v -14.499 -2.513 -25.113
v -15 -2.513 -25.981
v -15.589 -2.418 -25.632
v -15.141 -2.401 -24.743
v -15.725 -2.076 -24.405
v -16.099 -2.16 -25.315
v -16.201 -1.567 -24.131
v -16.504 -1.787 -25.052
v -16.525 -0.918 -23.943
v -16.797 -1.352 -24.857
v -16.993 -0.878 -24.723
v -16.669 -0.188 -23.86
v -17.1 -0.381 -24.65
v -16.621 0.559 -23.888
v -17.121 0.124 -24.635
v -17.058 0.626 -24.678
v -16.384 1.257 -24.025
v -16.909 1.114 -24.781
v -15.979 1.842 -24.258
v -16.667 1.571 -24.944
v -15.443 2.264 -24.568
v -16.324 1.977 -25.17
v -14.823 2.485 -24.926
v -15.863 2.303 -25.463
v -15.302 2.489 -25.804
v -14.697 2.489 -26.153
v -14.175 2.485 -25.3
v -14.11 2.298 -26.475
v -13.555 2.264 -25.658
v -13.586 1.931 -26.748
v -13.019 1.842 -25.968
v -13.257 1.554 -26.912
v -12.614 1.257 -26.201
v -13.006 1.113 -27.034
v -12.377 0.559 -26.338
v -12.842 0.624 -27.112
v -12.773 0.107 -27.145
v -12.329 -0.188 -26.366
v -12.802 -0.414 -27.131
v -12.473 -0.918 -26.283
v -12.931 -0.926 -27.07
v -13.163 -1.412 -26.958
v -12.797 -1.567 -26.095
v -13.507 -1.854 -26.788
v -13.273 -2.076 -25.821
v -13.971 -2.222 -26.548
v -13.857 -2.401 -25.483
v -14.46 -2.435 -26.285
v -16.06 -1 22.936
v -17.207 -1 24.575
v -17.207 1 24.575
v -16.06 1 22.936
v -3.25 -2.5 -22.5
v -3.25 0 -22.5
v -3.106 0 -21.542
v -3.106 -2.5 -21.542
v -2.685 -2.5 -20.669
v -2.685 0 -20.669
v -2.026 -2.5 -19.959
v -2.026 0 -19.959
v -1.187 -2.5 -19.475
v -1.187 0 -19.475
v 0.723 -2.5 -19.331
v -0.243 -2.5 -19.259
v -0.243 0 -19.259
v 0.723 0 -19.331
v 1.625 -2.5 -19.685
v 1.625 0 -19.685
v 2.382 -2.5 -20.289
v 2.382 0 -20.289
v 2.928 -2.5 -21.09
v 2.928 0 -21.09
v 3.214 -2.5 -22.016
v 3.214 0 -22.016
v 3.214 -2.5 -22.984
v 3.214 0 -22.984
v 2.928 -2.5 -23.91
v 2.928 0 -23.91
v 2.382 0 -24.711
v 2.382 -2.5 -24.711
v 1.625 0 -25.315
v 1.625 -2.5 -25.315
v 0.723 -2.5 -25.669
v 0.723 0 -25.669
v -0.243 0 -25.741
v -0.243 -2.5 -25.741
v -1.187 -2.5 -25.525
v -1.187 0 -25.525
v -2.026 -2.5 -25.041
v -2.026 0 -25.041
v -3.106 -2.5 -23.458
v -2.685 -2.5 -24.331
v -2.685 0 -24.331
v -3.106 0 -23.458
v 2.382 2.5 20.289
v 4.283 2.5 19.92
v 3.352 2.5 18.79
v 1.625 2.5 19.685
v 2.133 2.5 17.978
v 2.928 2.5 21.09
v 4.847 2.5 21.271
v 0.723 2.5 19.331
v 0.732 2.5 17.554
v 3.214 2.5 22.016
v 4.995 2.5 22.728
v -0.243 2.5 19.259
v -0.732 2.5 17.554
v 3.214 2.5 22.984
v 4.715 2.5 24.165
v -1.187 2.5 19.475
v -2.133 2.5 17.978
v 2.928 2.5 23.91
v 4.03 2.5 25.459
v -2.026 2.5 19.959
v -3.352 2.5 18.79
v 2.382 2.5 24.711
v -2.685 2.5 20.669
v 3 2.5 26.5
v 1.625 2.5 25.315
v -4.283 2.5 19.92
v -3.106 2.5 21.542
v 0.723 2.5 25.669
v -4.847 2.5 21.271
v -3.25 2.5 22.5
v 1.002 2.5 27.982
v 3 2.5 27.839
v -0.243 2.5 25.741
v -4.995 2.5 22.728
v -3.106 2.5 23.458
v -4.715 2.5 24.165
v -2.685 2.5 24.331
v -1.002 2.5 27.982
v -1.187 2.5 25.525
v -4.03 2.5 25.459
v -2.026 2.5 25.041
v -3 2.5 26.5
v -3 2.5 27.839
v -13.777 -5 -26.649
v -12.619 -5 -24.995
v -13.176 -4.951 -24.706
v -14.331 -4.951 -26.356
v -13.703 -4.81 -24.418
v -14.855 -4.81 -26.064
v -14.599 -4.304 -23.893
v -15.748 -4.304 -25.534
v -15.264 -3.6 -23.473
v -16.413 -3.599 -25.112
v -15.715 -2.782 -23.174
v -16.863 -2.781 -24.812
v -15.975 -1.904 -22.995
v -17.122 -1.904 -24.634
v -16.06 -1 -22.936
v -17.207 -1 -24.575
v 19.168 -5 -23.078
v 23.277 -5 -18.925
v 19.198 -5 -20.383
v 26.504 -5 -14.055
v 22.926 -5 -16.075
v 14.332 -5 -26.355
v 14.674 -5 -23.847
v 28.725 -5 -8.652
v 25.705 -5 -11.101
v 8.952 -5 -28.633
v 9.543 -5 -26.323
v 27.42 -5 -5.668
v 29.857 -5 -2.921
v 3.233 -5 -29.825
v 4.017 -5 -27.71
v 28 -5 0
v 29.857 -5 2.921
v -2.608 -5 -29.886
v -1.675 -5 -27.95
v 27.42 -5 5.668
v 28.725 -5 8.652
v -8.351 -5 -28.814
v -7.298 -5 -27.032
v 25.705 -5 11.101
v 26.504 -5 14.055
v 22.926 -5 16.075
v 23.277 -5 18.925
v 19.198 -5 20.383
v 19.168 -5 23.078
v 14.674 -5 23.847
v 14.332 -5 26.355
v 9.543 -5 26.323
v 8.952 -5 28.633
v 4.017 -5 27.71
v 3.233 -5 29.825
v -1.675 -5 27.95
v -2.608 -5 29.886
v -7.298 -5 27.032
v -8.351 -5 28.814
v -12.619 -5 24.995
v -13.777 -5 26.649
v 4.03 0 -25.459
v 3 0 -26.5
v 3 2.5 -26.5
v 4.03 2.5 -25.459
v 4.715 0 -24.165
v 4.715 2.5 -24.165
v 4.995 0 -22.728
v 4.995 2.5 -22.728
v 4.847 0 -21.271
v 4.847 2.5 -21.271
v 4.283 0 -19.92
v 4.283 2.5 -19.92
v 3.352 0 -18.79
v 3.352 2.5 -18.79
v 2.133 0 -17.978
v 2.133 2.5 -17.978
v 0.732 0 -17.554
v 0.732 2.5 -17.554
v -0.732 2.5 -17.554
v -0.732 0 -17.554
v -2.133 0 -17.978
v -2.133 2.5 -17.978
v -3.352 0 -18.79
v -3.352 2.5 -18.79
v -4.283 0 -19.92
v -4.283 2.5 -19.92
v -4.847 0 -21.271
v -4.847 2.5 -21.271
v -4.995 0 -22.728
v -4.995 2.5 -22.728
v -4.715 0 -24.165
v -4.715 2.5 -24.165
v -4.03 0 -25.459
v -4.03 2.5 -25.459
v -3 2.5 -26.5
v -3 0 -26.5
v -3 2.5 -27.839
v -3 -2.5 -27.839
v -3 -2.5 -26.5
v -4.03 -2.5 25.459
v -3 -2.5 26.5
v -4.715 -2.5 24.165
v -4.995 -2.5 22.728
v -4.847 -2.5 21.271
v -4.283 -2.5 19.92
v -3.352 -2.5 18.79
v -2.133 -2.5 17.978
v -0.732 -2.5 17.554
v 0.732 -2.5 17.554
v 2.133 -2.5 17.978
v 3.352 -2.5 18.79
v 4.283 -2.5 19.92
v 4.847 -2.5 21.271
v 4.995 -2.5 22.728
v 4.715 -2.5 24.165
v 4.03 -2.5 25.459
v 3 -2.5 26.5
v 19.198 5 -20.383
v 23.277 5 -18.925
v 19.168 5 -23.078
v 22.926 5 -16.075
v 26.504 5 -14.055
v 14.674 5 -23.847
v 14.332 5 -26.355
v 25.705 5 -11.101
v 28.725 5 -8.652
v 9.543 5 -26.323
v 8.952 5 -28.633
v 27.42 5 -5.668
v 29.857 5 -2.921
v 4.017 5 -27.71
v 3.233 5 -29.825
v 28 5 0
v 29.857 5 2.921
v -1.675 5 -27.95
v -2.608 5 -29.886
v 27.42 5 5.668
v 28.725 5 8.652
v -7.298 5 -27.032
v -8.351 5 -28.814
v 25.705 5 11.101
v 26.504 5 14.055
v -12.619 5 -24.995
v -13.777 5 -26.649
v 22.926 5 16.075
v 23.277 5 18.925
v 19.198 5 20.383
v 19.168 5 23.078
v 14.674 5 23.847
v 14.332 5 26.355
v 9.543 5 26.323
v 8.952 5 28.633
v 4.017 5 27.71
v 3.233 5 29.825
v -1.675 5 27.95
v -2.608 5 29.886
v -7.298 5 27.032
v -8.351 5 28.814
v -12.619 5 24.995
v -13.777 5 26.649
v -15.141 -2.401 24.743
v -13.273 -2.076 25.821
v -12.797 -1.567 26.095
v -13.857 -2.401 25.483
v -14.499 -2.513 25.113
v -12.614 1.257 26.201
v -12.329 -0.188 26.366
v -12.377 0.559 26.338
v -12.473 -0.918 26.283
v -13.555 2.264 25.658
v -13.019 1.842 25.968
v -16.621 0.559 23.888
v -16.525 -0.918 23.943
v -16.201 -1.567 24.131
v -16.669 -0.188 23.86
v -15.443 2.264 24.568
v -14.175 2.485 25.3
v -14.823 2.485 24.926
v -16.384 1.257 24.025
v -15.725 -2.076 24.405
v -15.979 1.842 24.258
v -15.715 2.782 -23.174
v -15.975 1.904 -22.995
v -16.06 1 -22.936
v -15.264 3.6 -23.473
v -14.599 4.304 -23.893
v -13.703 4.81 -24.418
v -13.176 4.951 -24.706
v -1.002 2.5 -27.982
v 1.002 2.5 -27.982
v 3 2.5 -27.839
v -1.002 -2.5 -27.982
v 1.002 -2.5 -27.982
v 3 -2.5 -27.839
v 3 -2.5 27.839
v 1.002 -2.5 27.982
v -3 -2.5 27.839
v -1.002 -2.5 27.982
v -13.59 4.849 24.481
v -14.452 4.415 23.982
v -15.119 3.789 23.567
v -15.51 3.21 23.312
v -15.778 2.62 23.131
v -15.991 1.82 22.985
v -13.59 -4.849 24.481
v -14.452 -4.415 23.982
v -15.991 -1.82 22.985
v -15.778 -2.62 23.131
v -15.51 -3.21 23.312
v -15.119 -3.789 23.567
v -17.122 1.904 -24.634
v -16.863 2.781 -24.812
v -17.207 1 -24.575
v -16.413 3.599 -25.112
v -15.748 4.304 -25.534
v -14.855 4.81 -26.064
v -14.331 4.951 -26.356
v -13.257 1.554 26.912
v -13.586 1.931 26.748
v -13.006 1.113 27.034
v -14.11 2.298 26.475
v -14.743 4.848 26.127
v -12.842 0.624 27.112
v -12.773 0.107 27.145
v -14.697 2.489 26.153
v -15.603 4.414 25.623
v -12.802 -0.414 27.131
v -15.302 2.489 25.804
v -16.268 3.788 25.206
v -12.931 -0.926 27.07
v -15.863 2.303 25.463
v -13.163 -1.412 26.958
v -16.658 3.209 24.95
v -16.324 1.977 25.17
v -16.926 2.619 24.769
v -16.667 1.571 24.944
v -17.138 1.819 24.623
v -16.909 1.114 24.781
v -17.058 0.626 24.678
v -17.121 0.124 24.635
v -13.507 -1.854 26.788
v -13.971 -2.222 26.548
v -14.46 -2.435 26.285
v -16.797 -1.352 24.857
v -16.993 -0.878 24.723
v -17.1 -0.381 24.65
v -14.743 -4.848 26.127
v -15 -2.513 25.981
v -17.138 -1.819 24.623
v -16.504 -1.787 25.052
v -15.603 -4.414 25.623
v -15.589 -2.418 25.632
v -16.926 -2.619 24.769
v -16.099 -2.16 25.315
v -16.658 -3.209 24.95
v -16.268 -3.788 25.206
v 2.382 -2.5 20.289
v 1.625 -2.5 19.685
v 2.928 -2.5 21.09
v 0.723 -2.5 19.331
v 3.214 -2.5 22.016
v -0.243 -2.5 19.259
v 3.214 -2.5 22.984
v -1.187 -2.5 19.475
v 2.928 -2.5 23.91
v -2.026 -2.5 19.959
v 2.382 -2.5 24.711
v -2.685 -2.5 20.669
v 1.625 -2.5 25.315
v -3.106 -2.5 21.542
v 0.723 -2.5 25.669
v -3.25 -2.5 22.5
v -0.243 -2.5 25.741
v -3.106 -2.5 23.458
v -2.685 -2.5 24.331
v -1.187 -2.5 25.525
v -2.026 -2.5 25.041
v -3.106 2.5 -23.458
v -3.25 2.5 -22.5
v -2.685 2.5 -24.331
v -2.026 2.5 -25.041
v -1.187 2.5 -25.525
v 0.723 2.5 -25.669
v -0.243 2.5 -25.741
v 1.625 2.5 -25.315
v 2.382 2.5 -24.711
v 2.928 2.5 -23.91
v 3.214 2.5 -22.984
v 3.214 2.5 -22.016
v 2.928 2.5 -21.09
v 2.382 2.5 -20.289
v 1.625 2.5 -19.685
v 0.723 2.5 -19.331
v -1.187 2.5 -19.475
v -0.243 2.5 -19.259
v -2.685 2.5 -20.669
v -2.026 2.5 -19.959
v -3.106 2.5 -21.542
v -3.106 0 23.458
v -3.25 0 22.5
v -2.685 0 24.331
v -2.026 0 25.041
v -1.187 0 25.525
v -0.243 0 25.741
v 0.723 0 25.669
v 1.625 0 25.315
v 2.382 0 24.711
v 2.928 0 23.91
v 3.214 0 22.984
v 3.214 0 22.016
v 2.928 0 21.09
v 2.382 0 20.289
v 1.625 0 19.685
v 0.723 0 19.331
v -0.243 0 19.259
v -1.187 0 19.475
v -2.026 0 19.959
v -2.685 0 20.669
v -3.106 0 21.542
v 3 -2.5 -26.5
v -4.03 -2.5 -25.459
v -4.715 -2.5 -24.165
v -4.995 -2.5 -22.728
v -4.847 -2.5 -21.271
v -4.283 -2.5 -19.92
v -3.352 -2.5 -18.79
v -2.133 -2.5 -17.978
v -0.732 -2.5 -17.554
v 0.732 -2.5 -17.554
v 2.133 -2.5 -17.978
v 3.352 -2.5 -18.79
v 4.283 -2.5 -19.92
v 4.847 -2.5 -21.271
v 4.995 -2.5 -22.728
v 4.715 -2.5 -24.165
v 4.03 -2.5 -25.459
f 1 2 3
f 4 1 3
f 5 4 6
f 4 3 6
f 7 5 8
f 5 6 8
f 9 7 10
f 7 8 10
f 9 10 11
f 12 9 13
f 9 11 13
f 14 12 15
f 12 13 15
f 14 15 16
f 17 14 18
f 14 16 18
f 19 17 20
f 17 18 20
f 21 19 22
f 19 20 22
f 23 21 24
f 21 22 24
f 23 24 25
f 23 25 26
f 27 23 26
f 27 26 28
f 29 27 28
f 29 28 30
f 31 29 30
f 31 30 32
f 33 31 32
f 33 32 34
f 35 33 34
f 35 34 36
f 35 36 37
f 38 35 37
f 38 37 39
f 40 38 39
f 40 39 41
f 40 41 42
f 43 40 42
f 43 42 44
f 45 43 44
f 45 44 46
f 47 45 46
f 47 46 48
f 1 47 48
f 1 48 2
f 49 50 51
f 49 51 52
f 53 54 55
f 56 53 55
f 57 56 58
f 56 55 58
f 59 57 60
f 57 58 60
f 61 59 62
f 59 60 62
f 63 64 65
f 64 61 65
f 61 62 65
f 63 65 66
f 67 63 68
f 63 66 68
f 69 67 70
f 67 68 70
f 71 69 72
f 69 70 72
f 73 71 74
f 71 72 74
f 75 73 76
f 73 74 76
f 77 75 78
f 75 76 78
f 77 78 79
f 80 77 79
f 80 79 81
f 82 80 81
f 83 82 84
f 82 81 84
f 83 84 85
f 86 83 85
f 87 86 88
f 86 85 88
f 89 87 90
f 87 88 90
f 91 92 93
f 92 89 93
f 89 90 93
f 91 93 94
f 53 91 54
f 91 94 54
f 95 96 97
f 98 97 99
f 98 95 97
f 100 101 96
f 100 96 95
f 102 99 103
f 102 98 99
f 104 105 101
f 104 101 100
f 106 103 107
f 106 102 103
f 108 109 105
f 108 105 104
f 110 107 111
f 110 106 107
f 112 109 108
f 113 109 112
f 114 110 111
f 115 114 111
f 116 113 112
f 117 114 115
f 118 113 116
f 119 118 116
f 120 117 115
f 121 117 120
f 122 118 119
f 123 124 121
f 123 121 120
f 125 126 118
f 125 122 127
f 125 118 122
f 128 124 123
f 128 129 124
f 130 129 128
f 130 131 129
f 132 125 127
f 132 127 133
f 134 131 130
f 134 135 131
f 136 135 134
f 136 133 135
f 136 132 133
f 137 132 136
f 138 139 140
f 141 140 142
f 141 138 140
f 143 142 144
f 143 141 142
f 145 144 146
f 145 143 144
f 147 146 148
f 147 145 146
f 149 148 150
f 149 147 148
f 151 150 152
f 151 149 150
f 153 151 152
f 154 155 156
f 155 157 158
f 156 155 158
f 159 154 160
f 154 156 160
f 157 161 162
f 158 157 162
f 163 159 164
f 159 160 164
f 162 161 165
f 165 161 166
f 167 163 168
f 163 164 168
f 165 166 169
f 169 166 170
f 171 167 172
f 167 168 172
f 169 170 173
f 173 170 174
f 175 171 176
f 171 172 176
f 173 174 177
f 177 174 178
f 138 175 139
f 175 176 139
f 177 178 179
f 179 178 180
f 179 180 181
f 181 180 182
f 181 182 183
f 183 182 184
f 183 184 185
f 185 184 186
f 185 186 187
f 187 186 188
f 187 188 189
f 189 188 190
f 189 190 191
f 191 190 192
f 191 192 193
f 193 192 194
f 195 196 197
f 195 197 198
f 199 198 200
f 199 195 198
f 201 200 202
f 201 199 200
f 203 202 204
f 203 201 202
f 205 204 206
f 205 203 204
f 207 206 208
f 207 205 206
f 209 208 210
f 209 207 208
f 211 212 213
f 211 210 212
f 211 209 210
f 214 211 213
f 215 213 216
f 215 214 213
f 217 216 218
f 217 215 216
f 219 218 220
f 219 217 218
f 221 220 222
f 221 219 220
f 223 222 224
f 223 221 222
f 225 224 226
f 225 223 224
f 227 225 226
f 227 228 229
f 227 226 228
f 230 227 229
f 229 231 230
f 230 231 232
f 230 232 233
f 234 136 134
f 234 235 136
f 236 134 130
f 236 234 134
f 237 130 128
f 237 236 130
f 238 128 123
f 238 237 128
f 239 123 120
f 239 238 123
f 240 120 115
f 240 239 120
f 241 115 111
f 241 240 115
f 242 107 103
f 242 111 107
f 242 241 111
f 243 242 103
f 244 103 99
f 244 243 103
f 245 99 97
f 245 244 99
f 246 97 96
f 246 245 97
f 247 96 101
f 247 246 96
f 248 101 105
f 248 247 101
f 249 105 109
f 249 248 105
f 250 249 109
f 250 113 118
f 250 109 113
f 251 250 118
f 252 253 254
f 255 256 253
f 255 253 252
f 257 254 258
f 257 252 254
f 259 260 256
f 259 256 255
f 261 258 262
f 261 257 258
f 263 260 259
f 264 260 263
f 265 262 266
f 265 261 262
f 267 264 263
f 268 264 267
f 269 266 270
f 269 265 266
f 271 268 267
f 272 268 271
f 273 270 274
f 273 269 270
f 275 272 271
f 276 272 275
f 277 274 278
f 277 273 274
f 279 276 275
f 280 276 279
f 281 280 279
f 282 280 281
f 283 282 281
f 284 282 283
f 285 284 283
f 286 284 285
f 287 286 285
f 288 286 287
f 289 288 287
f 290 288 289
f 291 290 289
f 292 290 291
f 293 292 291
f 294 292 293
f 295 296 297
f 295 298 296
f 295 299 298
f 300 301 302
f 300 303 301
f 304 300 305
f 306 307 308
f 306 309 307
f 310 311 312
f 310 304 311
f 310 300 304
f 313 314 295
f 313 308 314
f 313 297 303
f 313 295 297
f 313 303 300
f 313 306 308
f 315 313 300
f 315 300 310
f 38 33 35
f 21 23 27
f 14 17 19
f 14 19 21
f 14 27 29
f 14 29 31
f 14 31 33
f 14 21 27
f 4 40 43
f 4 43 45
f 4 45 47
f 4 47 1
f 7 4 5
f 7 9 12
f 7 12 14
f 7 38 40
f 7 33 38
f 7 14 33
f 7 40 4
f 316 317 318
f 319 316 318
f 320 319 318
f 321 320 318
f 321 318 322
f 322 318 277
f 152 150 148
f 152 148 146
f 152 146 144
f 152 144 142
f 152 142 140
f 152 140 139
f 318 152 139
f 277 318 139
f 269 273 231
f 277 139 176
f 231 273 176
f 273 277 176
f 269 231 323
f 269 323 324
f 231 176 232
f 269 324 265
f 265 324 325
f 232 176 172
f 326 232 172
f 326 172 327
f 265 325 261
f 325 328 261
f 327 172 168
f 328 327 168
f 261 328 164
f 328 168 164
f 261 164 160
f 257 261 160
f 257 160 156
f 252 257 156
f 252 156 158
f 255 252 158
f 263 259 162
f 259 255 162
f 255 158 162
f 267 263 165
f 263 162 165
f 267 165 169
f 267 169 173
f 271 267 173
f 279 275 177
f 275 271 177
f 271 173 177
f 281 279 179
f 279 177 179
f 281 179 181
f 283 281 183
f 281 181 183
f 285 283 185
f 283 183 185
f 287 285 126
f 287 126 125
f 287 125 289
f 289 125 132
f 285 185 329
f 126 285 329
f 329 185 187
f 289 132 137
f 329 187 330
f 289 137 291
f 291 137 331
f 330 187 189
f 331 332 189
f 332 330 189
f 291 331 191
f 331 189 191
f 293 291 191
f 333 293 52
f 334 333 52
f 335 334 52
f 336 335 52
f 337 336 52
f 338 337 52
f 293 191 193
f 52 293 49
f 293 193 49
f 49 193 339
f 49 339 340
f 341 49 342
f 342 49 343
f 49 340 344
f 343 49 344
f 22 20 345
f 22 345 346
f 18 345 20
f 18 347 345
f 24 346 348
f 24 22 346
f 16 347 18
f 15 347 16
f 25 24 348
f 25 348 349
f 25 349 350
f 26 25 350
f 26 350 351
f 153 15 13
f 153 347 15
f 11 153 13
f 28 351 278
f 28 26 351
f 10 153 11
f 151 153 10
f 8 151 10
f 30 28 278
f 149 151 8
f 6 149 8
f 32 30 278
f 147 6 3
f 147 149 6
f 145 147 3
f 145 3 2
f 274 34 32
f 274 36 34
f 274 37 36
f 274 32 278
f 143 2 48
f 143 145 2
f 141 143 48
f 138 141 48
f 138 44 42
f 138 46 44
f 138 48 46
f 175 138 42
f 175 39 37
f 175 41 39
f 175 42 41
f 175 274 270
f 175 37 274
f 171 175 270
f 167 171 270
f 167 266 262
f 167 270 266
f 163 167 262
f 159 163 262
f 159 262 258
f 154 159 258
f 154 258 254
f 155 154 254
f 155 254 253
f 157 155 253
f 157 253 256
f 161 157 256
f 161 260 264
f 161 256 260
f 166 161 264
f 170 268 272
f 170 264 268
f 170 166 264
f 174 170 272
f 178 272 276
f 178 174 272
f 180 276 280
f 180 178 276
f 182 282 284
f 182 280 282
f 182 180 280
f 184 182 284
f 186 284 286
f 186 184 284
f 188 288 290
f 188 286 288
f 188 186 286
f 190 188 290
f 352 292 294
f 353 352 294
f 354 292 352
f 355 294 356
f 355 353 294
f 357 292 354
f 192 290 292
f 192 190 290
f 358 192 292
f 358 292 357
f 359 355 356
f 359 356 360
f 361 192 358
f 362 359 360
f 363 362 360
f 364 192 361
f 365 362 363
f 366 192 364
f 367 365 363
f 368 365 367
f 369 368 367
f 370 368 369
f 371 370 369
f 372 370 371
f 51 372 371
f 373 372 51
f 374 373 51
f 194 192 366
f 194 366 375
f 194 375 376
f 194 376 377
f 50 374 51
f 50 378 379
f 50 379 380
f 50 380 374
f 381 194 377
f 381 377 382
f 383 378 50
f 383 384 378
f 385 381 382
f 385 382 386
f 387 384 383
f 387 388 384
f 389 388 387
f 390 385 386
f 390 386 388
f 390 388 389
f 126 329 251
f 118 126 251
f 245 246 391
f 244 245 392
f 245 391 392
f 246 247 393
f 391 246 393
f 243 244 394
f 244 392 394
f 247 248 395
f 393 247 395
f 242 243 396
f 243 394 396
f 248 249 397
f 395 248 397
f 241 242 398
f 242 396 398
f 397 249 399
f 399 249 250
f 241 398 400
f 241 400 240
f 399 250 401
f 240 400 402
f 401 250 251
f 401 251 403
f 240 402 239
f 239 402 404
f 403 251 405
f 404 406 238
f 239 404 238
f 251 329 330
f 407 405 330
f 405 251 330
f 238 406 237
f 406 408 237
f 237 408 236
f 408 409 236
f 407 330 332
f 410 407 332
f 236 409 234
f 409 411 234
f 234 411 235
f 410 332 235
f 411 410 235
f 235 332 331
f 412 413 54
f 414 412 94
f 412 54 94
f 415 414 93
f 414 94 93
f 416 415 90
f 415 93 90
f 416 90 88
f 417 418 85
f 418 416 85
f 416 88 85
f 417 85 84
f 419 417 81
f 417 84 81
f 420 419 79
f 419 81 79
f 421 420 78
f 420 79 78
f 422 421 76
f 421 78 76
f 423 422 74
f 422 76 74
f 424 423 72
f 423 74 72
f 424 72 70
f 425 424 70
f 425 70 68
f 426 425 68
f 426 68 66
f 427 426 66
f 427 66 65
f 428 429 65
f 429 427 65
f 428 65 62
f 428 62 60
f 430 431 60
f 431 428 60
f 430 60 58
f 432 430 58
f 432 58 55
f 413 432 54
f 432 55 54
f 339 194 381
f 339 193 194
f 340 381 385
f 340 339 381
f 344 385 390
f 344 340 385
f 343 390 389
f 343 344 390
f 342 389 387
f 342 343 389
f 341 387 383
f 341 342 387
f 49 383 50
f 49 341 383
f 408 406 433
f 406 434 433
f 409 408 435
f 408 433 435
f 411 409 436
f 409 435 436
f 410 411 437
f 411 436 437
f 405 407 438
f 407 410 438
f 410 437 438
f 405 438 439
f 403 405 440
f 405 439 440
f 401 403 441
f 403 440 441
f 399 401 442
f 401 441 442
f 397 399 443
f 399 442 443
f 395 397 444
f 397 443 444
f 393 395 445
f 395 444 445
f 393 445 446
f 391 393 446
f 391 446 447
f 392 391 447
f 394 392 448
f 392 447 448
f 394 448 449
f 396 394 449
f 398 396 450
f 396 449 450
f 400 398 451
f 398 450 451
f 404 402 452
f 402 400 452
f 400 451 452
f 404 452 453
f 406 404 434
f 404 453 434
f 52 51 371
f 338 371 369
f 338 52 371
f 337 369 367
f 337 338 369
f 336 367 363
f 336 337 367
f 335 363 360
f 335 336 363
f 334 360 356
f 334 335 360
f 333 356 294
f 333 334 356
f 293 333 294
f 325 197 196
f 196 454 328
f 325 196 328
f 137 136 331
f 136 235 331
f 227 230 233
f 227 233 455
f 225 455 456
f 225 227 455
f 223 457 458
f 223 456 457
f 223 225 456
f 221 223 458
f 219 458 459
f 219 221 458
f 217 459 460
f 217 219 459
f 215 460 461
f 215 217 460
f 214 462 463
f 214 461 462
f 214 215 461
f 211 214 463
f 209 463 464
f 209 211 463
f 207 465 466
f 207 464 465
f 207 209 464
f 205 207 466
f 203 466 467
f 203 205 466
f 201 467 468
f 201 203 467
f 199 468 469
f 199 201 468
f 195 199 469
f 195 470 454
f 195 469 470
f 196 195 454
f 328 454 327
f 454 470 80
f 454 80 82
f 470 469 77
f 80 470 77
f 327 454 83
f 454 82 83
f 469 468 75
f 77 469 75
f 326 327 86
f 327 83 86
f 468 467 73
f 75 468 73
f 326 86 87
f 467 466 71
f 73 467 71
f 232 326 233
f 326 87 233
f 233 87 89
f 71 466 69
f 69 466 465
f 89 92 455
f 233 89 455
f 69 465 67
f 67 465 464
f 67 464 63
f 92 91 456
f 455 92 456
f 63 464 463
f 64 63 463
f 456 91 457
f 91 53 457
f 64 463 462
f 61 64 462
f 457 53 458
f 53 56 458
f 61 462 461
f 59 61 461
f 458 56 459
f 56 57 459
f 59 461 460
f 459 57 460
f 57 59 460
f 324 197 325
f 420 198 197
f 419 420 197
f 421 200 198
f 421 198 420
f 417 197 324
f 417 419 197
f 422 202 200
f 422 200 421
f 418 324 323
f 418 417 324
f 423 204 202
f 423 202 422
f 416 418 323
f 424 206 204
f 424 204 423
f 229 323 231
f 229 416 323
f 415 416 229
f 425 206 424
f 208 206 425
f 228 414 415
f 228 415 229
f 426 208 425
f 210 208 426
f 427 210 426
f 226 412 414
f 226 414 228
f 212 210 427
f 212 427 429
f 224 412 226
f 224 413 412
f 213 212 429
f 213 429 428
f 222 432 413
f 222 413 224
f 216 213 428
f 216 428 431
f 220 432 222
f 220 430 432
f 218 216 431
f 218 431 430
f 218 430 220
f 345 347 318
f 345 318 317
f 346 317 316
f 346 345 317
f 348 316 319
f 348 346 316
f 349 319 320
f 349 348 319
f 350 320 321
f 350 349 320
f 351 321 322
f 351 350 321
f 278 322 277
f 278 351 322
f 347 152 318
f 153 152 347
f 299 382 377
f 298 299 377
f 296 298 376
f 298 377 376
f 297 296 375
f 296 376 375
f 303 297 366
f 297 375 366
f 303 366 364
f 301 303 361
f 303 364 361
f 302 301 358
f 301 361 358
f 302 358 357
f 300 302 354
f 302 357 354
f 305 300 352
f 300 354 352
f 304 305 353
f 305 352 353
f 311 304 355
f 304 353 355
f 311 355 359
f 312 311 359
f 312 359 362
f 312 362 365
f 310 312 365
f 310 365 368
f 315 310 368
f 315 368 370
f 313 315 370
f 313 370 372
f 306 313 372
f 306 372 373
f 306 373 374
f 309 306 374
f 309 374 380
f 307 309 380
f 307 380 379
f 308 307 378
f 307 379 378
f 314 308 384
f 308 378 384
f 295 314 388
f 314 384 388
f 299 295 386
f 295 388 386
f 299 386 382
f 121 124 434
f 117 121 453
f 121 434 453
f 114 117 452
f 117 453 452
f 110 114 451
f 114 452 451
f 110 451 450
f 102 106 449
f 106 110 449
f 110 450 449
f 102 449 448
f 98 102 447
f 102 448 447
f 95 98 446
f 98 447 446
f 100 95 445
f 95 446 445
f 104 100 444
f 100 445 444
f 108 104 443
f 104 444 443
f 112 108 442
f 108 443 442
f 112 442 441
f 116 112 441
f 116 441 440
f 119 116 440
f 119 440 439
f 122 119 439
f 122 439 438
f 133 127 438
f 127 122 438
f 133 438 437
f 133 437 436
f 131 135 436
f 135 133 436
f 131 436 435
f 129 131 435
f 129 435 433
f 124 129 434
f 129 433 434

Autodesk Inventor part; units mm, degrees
ref_plane "YZ Plane" through (0, 0, 0) normal (1, 0, 0) x (0, 1, 0)
ref_plane "XZ Plane" through (0, 0, 0) normal (0, 1, 0) x (-1, 0, 0)
ref_plane "XY Plane" through (0, 0, 0) normal (0, 0, 1) x (1, 0, 0)
sketch "Skizze1" plane through (0, 0, 0) normal (0, 1, 0) x (-1, 0, 0)
  circle A0 centre (0, 0) radius 28
  circle A1 centre (0, 0) radius 30
  dimension "d0" = 56
  dimension "d1" = 60
extrude "Extrusion1" add sketch "Skizze1" along normal mid plane 10
sketch "Skizze2" plane through (0, 0, 0) normal (0, 1, 0) x (-1, 0, 0)
  circle A0 centre (0, 22.5) radius 3.25
  circle A1 centre (0, -22.5) radius 3.25
  line L0 (44.9262, 0) -> (-43.1306, 0) construction
  circle A2 centre (0, -22.5) radius 5
  circle A3 centre (0, 22.5) radius 5
  line L1 (0, 38.6377) -> (0, -60.2779) construction
  line L2 (3, 29.5) -> (-3, 29.5)
  line L3 (-3, 29.5) -> (-3, -29.5)
  line L4 (-3, -29.5) -> (3, -29.5)
  line L5 (3, -29.5) -> (3, 29.5)
  point P0 (0, 0)
  point P1 (-3, 26.5)
  point P2 (3, 26.5)
  point P3 (-3, -26.5)
  point P4 (3, -26.5)
  dimension "d4" = 45
  dimension "d5" = 6.5
  dimension "d6" = 6.5
  dimension "d7" = 10
  dimension "d8" = 10
  dimension "d9" = 6
  dimension "d21" = 59
extrude "Extrusion2" add sketch "Skizze2" along normal mid plane 5 contours A0 L5 A3 | A0 L3 A3 L5 | L5 A3 L3 A0 | A0 L3 A3 | A3 L3 L2 L5 | L5 A1 L3 A2 | A2 L5 A1 | L3 A1 A2 | L3 A1 L5 A2 | A2 L5 L4 L3
sketch "Skizze3" plane through (0, 0, 0) normal (0, 1, 0) x (-1, 0, 0)
  line L0 (-37.328, 53.3099) -> (47.5678, -67.9338) construction
  line L1 (48.5469, 69.3321) -> (-29.5635, -42.2211) construction
  line L2 (0, 56.0595) -> (0, -79.5026) construction
  circle A0 centre (0, 0) radius 30
  circle A1 centre (0, 0) radius 28
  line L3 (19.8236, 28.311) -> (13.732, 19.6114)
  line L4 (14.4871, -20.6897) -> (22.3283, -31.8882)
  point P0 (16.0601, -22.9363)
  point P1 (17.2073, -24.5746)
  point P2 (17.2073, 24.5746)
  point P3 (16.0601, 22.9363)
  dimension "d12" = 110
  dimension "d13" = 35
  dimension "d19" = 56
  dimension "d20" = 60
extrude "Extrusion3" cut sketch "Skizze3" along normal mid plane 10 contours A0 L4 A1 L3 picked at (29.0468, 2.3769)
sketch "Skizze4" plane through (0, 0, 0) normal (0, 1, 0) x (-1, 0, 0)
  line L0 (-8.0451, 13.9345) -> (38.1422, -66.0642) construction
  line L1 (17.2073, -24.5746) -> (16.0601, -22.9363) construction
  line L2 (0, 9.2259) -> (0, -51.7672) construction
  arc A0 (17.2073, 24.5746) -> (17.2073, -24.5746) centre (0, 0) ccw projected
  point P0 (16.6337, -23.7554)
  point P1 (15, -25.9808)
  point P2 (15, -25.9808)
  point P3 (19.2393, -22.9285)
  dimension "d16" = 30
ref_plane "Arbeitsebene3" through (-15.5, 0, -26.8468) normal (-0.4226, 0, -0.9063) x (0, -1, 0)
sketch "Skizze5" plane through (-15.5, 0, -26.8468) normal (-0.4226, 0, -0.9063) x (0, -1, 0)
  point P0 (0, -2.7018)
ref_plane "Arbeitsebene4" through (-15, 0, -25.9808) normal (-0.5, 0, -0.866) x (0, -1, 0)
sketch "Skizze6" plane through (-15, 0, -25.9808) normal (-0.5, 0, -0.866) x (0, -1, 0)
  circle A0 centre (0, 0) radius 2.5131
  point P0 (0, 0)
extrude "Extrusion5" cut sketch "Skizze6" against normal blind 1
mirror "Spiegeln2" about plane through (0, 0, 0) normal (0, 0, 1) of "Extrusion5"
fillet "Rundung1" radius 4 4 edges at (-16.6337, -5, -23.7554) (-16.6337, 5, -23.7554) (-16.6337, 5, 23.7554) (-16.6337, -5, 23.7554)
ref_plane "Arbeitsebene5" through (0, 0, 0) normal (0, 0, 1) x (1, 0, 0)
properties part number "_3D-Druck"
